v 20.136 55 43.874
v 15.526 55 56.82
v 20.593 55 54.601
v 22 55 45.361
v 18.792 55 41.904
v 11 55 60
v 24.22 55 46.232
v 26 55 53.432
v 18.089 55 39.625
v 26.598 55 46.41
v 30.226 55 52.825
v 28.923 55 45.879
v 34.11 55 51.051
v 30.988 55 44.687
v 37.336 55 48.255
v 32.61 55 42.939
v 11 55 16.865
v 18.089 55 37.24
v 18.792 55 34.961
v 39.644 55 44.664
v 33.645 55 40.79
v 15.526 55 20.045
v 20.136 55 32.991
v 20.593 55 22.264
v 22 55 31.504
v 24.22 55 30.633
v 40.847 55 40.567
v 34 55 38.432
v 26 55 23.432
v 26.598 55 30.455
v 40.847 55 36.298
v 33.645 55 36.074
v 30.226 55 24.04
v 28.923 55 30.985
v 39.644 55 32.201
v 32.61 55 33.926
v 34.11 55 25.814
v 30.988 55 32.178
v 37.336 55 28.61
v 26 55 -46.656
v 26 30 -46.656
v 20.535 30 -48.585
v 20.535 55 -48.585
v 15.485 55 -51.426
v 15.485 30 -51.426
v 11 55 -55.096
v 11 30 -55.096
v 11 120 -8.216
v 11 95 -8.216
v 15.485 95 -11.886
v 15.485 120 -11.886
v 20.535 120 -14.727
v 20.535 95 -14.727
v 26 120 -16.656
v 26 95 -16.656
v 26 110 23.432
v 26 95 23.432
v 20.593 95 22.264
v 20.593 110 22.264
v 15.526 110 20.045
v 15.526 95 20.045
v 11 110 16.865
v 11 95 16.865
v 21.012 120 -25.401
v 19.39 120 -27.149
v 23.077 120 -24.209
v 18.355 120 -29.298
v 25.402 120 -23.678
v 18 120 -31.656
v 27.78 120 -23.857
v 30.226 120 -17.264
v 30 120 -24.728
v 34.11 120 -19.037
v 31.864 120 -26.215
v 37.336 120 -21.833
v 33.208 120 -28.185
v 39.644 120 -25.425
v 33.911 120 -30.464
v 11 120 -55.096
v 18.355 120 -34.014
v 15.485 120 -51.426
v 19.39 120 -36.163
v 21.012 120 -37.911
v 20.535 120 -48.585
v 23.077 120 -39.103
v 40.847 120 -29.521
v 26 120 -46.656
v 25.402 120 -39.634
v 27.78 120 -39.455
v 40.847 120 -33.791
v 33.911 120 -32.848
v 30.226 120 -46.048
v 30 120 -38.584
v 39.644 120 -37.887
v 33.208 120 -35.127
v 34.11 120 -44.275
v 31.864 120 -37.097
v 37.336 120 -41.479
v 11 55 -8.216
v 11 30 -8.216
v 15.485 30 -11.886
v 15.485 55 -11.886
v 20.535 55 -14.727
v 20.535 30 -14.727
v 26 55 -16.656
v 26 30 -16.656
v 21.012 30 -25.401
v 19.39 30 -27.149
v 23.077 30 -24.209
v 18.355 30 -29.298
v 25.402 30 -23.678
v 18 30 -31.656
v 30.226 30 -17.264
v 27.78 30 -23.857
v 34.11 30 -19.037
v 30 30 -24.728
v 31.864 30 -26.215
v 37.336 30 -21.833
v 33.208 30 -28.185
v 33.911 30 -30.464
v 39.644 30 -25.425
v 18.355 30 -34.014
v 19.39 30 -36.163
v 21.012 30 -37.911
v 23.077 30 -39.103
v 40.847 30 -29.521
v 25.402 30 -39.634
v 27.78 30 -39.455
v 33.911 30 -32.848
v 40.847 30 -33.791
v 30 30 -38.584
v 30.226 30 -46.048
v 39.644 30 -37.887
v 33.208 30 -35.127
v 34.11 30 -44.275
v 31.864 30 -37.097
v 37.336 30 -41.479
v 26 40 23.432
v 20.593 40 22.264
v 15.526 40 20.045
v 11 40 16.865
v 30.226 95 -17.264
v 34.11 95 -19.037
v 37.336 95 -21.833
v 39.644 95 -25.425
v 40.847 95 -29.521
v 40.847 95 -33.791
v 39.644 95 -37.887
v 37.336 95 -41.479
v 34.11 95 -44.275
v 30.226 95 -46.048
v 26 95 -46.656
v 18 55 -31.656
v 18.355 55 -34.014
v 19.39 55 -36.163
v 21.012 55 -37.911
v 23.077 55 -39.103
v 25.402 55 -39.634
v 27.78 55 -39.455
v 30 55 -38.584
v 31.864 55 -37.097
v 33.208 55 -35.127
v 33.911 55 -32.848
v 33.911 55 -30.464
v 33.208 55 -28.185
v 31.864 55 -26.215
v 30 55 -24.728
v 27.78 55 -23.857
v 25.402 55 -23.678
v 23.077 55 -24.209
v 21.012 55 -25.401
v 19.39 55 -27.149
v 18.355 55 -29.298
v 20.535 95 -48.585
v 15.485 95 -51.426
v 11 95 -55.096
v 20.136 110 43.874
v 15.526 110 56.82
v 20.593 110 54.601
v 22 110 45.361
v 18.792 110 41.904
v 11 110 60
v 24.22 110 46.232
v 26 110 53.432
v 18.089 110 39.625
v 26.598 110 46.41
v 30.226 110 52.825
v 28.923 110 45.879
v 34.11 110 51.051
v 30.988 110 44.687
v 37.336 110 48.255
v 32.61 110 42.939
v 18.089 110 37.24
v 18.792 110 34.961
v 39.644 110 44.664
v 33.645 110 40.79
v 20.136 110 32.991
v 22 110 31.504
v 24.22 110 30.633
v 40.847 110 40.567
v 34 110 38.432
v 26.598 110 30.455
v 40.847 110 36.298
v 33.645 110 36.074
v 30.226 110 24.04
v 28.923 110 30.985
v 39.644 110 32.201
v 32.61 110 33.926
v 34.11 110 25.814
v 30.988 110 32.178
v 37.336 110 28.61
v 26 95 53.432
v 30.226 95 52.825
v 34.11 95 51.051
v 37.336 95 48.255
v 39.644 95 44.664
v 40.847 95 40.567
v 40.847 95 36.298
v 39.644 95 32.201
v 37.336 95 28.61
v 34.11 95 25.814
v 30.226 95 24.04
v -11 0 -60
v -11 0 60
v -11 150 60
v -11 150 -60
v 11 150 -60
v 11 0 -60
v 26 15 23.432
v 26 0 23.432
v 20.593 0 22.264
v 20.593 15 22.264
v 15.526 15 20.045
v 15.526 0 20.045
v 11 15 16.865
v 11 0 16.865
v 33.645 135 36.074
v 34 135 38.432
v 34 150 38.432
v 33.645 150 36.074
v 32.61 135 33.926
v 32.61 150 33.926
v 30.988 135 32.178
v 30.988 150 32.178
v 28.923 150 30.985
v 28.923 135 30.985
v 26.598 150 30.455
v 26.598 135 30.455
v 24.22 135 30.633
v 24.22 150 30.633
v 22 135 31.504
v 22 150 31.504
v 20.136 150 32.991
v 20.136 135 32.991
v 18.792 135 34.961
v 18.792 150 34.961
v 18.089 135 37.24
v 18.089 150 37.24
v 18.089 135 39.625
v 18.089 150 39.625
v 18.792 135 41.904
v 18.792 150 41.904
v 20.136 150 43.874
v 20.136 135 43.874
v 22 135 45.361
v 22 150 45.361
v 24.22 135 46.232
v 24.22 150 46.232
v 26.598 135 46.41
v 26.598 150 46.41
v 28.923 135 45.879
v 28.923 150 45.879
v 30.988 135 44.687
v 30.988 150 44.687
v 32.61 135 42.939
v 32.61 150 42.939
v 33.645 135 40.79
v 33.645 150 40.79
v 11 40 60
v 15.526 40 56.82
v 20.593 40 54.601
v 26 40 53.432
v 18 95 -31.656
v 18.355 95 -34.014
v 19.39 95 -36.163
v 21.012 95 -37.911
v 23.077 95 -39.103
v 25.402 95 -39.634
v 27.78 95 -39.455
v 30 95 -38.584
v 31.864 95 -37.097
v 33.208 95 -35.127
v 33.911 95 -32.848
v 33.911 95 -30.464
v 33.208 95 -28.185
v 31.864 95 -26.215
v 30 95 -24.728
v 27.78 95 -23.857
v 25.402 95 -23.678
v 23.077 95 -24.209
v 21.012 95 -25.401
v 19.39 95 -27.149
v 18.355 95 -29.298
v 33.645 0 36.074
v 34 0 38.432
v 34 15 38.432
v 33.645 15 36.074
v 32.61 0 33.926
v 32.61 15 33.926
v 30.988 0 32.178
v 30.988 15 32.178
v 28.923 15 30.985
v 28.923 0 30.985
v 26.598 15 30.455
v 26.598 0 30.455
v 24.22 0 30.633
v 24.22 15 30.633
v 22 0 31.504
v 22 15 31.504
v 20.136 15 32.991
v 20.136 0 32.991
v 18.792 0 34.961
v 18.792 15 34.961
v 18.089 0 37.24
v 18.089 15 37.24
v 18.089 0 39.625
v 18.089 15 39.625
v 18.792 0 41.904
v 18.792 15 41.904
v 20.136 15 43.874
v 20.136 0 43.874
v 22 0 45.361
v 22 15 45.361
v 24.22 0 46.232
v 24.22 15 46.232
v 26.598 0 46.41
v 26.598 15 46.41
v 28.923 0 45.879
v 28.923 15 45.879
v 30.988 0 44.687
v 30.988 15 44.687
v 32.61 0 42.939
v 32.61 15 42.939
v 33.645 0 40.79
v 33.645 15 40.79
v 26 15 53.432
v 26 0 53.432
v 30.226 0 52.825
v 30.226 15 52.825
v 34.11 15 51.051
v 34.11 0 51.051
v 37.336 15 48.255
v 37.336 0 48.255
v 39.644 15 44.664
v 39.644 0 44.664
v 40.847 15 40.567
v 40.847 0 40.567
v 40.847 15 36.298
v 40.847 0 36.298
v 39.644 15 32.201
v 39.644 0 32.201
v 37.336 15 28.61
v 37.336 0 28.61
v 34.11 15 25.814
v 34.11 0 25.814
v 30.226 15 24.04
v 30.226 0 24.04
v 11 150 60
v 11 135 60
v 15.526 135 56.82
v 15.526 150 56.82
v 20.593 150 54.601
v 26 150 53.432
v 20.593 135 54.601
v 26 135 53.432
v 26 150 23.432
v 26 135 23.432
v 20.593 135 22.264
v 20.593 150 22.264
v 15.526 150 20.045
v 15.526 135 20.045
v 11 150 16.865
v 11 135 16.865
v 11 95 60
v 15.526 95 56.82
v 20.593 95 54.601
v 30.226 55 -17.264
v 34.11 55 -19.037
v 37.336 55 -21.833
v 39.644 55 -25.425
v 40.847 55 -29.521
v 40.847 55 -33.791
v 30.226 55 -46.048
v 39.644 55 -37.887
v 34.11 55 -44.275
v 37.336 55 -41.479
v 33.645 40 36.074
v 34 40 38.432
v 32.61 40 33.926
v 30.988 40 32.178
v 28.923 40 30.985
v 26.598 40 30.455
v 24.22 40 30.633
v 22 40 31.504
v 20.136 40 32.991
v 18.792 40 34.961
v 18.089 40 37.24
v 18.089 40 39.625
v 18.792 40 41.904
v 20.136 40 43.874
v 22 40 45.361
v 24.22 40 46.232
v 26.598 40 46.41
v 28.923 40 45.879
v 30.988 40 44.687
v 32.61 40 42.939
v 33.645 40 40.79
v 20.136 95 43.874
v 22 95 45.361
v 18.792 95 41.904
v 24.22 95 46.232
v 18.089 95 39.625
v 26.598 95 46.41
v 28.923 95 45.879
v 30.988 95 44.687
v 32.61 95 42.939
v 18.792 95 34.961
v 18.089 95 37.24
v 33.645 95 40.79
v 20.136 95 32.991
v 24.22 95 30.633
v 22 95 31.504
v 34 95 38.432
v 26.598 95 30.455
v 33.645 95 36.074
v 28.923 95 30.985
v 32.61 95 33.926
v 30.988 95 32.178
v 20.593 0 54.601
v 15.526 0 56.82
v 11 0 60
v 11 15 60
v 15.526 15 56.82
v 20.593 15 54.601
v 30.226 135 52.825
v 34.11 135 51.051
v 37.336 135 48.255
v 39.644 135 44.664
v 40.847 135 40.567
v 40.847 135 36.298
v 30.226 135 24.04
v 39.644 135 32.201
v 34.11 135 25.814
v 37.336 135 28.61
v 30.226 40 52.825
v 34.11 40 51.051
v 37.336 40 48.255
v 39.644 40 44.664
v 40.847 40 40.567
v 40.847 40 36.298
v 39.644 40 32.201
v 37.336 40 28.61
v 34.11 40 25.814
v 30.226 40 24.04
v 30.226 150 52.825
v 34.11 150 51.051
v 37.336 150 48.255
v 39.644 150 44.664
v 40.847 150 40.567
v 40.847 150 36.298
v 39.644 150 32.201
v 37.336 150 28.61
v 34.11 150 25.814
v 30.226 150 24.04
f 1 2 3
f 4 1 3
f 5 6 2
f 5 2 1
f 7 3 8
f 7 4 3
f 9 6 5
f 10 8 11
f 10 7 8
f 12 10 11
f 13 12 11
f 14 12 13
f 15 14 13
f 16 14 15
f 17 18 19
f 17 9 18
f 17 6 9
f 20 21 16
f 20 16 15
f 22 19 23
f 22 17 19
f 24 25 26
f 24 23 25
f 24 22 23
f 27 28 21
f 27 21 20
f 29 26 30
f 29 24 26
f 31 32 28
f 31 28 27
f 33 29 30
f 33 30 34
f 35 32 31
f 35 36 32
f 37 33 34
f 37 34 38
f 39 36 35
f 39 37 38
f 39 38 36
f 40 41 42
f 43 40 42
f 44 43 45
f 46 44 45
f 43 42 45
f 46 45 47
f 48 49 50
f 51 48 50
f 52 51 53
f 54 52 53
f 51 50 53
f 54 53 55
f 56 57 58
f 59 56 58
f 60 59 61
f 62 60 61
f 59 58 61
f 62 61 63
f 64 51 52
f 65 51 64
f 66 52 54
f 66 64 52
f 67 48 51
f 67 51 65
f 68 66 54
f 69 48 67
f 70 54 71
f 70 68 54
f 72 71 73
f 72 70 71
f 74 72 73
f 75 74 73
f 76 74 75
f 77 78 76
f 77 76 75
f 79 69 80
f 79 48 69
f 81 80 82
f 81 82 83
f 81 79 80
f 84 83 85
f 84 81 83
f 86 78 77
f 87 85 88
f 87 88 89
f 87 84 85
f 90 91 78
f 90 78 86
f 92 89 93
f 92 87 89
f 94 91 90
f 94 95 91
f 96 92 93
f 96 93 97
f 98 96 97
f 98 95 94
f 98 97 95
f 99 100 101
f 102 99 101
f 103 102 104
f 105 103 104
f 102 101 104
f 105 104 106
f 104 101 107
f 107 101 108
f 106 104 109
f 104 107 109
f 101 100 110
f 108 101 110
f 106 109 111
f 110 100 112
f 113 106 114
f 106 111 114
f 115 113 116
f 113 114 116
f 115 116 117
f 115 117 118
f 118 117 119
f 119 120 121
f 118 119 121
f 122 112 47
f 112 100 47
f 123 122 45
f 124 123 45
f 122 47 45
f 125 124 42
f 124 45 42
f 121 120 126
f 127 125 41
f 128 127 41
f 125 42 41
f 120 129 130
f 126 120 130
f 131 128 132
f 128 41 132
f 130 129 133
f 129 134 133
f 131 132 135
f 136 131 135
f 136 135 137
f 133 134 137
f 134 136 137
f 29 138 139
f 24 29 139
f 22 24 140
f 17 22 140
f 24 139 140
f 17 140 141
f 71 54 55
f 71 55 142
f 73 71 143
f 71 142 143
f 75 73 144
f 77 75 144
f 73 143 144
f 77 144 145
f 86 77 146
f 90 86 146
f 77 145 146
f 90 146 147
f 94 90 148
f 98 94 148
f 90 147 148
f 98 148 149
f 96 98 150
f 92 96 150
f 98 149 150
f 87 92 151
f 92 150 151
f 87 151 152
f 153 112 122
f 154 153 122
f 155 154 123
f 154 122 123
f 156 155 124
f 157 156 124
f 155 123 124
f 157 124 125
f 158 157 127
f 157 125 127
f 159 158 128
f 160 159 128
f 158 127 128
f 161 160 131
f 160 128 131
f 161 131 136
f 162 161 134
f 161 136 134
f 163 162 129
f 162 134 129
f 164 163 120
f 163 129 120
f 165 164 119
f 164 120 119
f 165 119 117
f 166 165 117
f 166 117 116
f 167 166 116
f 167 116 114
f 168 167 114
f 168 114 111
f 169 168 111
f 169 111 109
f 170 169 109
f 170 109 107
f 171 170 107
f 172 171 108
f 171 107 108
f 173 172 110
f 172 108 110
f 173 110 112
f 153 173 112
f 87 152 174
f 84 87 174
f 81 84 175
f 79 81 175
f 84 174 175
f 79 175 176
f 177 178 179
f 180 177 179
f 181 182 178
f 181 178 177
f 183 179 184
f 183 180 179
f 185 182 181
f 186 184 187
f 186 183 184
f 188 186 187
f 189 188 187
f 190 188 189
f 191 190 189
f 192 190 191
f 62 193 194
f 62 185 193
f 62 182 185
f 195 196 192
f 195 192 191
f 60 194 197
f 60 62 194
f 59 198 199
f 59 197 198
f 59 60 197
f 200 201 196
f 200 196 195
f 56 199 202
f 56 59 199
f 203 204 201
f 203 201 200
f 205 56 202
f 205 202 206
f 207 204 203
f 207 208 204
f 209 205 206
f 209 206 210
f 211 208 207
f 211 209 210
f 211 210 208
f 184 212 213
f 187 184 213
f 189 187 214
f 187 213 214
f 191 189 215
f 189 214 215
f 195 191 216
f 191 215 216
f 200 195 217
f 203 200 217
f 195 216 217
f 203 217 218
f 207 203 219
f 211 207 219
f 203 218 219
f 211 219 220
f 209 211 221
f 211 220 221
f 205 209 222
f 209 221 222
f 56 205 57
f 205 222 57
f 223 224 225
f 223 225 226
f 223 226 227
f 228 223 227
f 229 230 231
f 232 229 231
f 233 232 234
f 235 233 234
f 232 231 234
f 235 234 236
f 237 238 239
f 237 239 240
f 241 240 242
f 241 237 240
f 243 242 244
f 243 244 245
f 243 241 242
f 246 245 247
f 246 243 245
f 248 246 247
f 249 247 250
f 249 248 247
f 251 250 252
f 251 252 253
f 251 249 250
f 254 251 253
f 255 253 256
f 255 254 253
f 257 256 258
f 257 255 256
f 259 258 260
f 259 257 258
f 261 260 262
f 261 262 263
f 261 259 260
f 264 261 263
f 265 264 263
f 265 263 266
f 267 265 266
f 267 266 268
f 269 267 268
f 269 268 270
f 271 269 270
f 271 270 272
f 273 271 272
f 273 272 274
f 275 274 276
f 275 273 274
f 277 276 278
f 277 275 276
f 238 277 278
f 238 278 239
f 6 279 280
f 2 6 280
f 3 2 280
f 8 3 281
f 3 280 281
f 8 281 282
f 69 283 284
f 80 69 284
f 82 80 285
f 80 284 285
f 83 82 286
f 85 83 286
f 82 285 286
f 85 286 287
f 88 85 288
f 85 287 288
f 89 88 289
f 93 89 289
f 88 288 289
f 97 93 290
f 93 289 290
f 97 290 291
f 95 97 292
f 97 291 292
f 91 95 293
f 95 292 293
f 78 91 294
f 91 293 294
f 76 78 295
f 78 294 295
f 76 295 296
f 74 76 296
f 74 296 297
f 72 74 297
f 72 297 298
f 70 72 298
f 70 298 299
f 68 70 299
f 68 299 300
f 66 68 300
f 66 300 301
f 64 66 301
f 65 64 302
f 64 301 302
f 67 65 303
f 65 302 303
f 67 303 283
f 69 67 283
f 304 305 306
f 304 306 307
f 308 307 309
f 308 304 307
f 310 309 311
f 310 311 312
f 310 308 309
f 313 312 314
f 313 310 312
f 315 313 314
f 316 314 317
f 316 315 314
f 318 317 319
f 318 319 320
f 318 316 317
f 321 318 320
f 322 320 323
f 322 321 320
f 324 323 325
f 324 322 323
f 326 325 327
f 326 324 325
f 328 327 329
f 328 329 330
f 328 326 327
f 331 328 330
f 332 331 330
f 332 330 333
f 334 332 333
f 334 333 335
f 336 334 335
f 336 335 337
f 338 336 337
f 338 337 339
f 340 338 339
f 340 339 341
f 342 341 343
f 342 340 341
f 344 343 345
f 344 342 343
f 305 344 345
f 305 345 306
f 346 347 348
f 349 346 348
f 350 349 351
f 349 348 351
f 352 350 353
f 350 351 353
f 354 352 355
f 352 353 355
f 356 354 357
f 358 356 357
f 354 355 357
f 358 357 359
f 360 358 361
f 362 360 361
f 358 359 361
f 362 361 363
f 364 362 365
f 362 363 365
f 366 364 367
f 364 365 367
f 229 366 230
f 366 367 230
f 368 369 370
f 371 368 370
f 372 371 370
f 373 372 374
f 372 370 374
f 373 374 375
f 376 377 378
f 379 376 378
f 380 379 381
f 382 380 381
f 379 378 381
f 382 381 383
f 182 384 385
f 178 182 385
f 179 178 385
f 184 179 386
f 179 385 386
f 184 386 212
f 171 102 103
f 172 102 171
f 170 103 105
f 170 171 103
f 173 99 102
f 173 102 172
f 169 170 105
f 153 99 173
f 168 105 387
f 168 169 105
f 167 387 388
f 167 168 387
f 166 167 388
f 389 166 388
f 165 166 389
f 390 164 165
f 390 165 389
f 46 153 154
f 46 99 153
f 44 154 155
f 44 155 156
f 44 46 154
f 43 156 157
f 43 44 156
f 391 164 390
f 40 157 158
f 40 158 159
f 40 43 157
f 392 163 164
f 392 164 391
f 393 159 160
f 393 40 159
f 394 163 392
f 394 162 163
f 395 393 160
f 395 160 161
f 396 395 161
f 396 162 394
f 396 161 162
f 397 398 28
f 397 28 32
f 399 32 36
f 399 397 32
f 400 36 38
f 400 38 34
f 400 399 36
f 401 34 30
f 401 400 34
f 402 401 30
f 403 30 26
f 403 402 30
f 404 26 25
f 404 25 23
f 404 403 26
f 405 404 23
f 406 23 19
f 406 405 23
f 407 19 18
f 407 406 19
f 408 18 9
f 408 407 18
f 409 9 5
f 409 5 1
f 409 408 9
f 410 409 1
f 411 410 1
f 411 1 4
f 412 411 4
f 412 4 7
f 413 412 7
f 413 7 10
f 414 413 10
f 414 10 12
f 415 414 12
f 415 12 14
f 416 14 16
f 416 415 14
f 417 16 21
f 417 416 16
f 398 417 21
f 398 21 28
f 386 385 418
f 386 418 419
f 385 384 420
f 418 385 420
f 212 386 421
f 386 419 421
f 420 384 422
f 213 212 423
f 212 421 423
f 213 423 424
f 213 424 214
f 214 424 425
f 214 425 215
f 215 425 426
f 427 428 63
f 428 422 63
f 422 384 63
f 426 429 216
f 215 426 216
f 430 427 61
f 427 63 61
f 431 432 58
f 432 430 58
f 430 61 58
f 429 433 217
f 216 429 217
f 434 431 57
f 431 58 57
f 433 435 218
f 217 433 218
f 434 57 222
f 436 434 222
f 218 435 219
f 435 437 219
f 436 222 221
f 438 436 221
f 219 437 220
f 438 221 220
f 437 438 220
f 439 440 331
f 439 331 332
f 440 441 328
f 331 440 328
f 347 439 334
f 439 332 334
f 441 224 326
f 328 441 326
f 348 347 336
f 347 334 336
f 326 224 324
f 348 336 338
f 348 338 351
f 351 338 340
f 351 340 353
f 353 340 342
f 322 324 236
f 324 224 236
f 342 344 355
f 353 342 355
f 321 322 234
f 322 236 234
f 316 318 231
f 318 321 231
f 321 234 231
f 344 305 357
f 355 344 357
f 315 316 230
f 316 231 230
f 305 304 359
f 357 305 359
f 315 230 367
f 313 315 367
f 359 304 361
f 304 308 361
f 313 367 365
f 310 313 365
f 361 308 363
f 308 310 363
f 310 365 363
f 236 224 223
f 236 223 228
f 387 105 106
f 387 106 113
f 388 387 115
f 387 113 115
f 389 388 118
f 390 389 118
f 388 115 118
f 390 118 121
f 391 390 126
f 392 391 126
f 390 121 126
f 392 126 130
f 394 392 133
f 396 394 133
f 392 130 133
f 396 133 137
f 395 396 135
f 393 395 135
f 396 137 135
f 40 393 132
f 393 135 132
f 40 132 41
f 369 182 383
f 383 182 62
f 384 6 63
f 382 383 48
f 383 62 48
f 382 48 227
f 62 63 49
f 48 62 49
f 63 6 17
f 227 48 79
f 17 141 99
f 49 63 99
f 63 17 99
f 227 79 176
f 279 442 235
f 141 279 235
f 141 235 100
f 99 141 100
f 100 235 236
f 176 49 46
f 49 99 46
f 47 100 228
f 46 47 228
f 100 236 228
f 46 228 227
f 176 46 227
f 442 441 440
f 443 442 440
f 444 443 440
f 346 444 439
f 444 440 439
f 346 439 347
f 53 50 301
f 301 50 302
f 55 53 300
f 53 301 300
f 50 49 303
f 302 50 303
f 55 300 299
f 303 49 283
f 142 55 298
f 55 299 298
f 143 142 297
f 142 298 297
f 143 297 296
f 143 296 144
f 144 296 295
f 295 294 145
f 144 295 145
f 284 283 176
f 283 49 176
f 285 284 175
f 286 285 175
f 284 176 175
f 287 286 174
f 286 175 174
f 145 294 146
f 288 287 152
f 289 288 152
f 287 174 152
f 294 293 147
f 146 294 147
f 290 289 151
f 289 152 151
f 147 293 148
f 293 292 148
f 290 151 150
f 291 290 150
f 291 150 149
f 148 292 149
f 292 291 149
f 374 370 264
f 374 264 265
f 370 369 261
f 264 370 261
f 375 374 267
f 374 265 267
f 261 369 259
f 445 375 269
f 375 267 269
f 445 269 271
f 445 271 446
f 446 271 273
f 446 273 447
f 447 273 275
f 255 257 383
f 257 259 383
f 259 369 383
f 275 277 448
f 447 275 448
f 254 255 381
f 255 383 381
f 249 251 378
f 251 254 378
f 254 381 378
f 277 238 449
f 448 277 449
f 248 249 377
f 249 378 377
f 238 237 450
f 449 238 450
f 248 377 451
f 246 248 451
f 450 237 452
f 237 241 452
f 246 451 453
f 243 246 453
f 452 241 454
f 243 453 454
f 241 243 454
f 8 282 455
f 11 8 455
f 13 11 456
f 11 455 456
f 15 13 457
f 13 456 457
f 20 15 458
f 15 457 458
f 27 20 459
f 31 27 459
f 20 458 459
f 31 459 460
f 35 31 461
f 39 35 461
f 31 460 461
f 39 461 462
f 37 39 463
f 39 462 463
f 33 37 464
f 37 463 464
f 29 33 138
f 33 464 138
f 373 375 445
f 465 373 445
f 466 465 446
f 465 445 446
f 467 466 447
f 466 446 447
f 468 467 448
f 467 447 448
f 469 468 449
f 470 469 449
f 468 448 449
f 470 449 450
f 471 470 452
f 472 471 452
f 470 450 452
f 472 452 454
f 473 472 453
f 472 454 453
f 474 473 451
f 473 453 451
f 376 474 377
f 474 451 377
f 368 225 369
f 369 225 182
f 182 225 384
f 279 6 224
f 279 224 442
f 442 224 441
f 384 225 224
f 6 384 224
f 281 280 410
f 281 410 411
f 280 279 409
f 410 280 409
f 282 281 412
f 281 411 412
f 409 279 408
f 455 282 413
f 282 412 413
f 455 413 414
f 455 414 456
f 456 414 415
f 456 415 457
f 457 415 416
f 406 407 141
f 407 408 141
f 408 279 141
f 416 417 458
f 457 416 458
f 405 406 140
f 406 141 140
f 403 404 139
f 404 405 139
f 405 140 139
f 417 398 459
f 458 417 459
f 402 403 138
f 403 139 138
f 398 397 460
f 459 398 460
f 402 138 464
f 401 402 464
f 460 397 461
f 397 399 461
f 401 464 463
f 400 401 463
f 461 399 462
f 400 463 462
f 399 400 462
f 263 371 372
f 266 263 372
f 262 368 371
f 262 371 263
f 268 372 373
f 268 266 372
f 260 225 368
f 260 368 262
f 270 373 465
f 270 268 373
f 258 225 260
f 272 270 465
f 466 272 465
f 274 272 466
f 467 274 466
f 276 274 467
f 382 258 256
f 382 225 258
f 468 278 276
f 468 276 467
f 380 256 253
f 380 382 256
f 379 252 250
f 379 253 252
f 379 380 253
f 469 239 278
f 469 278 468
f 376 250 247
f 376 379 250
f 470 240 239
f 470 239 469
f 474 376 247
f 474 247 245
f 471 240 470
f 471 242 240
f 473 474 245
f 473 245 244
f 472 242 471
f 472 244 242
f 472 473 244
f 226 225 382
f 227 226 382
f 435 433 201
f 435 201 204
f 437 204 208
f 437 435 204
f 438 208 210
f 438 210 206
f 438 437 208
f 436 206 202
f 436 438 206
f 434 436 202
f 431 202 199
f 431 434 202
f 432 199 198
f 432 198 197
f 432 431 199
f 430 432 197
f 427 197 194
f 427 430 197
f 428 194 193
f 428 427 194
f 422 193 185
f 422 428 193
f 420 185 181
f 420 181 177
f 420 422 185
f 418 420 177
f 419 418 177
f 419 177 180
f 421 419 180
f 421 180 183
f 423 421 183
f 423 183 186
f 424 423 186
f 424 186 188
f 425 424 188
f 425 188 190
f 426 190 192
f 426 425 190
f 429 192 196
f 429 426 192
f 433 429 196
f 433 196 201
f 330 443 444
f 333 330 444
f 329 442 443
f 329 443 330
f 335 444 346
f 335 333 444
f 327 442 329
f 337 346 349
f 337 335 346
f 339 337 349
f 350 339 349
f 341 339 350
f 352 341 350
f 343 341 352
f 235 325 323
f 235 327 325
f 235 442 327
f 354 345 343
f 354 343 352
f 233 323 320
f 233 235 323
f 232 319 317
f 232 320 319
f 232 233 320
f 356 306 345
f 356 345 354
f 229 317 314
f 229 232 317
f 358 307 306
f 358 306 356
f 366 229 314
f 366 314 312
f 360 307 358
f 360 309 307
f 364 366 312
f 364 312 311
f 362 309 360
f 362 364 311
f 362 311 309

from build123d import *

# Parameters (mm, degrees)
SZKIC2_W                    = 22
SZKIC2_H                    = 120
DODANIE_WYCI_GNI_CIE1_DEPTH = 150
SZKIC3_R                    = 8
DODANIE_WYCI_GNI_CIE2_DEPTH = 15
SZYK_LINIOWY1_COUNT         = 2
SZYK_LINIOWY1_PITCH         = 40
SZYK_LINIOWY2_COUNT         = 2
SZYK_LINIOWY2_PITCH         = 135
SZYK_LINIOWY3_COUNT         = 2
SZYK_LINIOWY3_PITCH         = 95
SZKIC4_R                    = 8
DODANIE_WYCI_GNI_CIE3_DEPTH = 25
SZYK_LINIOWY4_COUNT         = 2
SZYK_LINIOWY4_PITCH         = 65


with BuildPart() as part:
    # Szkic2 → Dodanie-wyciągnięcie1 (new body)
    with BuildSketch(Plane(origin=(0, 0, 0), x_dir=(1, 0, 0), z_dir=(0, 1, 0))):
        Rectangle(SZKIC2_W, SZKIC2_H)
    extrude(amount=DODANIE_WYCI_GNI_CIE1_DEPTH)

    # Szkic3 → Dodanie-wyciągnięcie2 (add)
    with BuildSketch(Plane(origin=(0, 0, 0), x_dir=(1, 0, 0), z_dir=(0, 1, 0))):
        with BuildLine():
            Line((11, -16.864863098), (11, -60))
            ThreePointArc((11, -60), (18.004271641, -55.583996835), (26, -53.432431549))
            ThreePointArc((26, -53.432431549), (41, -38.432431549), (26, -23.432431549))
            ThreePointArc((26, -23.432431549), (18.004271641, -21.280866263), (11, -16.864863098))
        make_face()
        with Locations((26, -38.432431549)):
            Circle(SZKIC3_R, mode=Mode.SUBTRACT)
    dodanie_wyci_gni_cie2 = extrude(amount=DODANIE_WYCI_GNI_CIE2_DEPTH)

    # Szyk liniowy1: Dodanie-wyciągnięcie2 ×2
    with Locations(*[(0, i * SZYK_LINIOWY1_PITCH, 0) for i in range(1, SZYK_LINIOWY1_COUNT)]):
        add(dodanie_wyci_gni_cie2)

    # Szyk liniowy2: Dodanie-wyciągnięcie2 ×2
    with Locations(*[(0, i * SZYK_LINIOWY2_PITCH, 0) for i in range(1, SZYK_LINIOWY2_COUNT)]):
        add(dodanie_wyci_gni_cie2)

    # Szyk liniowy3: Dodanie-wyciągnięcie2 ×2
    with Locations(*[(0, i * SZYK_LINIOWY3_PITCH, 0) for i in range(1, SZYK_LINIOWY3_COUNT)]):
        add(dodanie_wyci_gni_cie2)

    # Szkic4 → Dodanie-wyciągnięcie3 (add)
    with BuildSketch(Plane(origin=(0, 30, 0), x_dir=(-1, 0, 0), z_dir=(0, -1, 0))):
        with BuildLine():
            Line((-11, 55.095776214), (-11, 8.216275777))
            ThreePointArc((-11, 8.216275777), (-17.948621334, 13.416118275), (-26, 16.656025995))
            ThreePointArc((-26, 16.656025995), (-41, 31.656025995), (-26, 46.656025995))
            ThreePointArc((-26, 46.656025995), (-17.948621334, 49.895933715), (-11, 55.095776214))
        make_face()
        with Locations((-26, 31.656025995)):
            Circle(SZKIC4_R, mode=Mode.SUBTRACT)
    dodanie_wyci_gni_cie3 = extrude(amount=-DODANIE_WYCI_GNI_CIE3_DEPTH)

    # Szyk liniowy4: Dodanie-wyciągnięcie3 ×2
    with Locations(*[(0, i * SZYK_LINIOWY4_PITCH, 0) for i in range(1, SZYK_LINIOWY4_COUNT)]):
        add(dodanie_wyci_gni_cie3)


solid = part.part
